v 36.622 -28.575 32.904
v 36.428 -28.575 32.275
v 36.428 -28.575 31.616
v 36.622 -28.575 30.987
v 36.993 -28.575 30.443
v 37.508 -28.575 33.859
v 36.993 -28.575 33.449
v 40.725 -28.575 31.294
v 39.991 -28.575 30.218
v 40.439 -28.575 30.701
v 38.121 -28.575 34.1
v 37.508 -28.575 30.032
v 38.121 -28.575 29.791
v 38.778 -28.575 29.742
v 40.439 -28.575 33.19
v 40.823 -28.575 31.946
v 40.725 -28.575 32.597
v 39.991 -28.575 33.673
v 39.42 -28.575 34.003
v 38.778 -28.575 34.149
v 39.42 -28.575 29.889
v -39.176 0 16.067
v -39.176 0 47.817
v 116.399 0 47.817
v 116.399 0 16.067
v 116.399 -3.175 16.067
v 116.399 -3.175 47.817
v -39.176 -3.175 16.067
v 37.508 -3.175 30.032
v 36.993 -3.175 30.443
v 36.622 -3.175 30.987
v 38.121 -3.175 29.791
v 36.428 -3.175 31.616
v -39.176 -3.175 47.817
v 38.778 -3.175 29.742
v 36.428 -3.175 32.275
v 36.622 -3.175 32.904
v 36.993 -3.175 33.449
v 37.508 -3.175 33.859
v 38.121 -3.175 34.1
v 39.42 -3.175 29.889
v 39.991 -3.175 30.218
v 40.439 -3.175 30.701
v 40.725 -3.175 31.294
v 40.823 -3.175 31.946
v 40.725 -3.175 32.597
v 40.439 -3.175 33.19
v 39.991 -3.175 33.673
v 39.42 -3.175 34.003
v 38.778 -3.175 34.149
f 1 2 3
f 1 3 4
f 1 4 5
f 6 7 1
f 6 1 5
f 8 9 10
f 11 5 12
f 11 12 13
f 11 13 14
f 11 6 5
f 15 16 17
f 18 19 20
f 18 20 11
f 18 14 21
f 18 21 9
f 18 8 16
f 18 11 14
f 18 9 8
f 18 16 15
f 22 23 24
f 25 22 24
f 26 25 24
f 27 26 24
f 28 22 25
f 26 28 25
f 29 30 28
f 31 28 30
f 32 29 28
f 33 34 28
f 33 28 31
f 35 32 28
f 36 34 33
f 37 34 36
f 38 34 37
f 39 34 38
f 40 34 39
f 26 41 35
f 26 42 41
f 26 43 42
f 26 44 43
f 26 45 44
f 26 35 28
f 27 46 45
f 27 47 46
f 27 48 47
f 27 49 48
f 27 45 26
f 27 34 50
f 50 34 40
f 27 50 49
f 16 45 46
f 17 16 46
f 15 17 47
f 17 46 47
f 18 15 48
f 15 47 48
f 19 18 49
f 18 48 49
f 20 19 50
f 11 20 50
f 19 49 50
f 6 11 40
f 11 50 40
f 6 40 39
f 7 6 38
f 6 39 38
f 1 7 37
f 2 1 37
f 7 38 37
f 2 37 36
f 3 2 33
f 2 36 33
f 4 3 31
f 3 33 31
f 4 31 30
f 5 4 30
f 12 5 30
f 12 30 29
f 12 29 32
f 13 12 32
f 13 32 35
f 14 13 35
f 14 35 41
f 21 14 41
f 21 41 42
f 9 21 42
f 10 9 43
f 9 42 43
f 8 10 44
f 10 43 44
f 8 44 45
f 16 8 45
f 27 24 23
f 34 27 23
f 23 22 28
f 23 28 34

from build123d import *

# Parameters (mm, degrees)
F0_W     = 77.7875
F0_H     = 31.75
F1_DEPTH = 3.175
F3_R     = 2.2098
F4_DEPTH = 25.4


with BuildPart() as f1:
    # F0 (on Front) → F1 (new body)
    with BuildSketch(Plane.XZ):
        with Locations((-0.282224, 31.94195)):
            Rectangle(F0_W, F0_H)
        with Locations((77.505276, 31.94195)):
            Rectangle(F0_W, F0_H)
    extrude(amount=F1_DEPTH)

    # F3 (on face) → F4 (join)
    with BuildSketch(Plane.XZ.offset(3.175)):
        with Locations((38.613036, 31.945616)):
            Circle(F3_R)
    extrude(amount=F4_DEPTH)


solid = f1.part
